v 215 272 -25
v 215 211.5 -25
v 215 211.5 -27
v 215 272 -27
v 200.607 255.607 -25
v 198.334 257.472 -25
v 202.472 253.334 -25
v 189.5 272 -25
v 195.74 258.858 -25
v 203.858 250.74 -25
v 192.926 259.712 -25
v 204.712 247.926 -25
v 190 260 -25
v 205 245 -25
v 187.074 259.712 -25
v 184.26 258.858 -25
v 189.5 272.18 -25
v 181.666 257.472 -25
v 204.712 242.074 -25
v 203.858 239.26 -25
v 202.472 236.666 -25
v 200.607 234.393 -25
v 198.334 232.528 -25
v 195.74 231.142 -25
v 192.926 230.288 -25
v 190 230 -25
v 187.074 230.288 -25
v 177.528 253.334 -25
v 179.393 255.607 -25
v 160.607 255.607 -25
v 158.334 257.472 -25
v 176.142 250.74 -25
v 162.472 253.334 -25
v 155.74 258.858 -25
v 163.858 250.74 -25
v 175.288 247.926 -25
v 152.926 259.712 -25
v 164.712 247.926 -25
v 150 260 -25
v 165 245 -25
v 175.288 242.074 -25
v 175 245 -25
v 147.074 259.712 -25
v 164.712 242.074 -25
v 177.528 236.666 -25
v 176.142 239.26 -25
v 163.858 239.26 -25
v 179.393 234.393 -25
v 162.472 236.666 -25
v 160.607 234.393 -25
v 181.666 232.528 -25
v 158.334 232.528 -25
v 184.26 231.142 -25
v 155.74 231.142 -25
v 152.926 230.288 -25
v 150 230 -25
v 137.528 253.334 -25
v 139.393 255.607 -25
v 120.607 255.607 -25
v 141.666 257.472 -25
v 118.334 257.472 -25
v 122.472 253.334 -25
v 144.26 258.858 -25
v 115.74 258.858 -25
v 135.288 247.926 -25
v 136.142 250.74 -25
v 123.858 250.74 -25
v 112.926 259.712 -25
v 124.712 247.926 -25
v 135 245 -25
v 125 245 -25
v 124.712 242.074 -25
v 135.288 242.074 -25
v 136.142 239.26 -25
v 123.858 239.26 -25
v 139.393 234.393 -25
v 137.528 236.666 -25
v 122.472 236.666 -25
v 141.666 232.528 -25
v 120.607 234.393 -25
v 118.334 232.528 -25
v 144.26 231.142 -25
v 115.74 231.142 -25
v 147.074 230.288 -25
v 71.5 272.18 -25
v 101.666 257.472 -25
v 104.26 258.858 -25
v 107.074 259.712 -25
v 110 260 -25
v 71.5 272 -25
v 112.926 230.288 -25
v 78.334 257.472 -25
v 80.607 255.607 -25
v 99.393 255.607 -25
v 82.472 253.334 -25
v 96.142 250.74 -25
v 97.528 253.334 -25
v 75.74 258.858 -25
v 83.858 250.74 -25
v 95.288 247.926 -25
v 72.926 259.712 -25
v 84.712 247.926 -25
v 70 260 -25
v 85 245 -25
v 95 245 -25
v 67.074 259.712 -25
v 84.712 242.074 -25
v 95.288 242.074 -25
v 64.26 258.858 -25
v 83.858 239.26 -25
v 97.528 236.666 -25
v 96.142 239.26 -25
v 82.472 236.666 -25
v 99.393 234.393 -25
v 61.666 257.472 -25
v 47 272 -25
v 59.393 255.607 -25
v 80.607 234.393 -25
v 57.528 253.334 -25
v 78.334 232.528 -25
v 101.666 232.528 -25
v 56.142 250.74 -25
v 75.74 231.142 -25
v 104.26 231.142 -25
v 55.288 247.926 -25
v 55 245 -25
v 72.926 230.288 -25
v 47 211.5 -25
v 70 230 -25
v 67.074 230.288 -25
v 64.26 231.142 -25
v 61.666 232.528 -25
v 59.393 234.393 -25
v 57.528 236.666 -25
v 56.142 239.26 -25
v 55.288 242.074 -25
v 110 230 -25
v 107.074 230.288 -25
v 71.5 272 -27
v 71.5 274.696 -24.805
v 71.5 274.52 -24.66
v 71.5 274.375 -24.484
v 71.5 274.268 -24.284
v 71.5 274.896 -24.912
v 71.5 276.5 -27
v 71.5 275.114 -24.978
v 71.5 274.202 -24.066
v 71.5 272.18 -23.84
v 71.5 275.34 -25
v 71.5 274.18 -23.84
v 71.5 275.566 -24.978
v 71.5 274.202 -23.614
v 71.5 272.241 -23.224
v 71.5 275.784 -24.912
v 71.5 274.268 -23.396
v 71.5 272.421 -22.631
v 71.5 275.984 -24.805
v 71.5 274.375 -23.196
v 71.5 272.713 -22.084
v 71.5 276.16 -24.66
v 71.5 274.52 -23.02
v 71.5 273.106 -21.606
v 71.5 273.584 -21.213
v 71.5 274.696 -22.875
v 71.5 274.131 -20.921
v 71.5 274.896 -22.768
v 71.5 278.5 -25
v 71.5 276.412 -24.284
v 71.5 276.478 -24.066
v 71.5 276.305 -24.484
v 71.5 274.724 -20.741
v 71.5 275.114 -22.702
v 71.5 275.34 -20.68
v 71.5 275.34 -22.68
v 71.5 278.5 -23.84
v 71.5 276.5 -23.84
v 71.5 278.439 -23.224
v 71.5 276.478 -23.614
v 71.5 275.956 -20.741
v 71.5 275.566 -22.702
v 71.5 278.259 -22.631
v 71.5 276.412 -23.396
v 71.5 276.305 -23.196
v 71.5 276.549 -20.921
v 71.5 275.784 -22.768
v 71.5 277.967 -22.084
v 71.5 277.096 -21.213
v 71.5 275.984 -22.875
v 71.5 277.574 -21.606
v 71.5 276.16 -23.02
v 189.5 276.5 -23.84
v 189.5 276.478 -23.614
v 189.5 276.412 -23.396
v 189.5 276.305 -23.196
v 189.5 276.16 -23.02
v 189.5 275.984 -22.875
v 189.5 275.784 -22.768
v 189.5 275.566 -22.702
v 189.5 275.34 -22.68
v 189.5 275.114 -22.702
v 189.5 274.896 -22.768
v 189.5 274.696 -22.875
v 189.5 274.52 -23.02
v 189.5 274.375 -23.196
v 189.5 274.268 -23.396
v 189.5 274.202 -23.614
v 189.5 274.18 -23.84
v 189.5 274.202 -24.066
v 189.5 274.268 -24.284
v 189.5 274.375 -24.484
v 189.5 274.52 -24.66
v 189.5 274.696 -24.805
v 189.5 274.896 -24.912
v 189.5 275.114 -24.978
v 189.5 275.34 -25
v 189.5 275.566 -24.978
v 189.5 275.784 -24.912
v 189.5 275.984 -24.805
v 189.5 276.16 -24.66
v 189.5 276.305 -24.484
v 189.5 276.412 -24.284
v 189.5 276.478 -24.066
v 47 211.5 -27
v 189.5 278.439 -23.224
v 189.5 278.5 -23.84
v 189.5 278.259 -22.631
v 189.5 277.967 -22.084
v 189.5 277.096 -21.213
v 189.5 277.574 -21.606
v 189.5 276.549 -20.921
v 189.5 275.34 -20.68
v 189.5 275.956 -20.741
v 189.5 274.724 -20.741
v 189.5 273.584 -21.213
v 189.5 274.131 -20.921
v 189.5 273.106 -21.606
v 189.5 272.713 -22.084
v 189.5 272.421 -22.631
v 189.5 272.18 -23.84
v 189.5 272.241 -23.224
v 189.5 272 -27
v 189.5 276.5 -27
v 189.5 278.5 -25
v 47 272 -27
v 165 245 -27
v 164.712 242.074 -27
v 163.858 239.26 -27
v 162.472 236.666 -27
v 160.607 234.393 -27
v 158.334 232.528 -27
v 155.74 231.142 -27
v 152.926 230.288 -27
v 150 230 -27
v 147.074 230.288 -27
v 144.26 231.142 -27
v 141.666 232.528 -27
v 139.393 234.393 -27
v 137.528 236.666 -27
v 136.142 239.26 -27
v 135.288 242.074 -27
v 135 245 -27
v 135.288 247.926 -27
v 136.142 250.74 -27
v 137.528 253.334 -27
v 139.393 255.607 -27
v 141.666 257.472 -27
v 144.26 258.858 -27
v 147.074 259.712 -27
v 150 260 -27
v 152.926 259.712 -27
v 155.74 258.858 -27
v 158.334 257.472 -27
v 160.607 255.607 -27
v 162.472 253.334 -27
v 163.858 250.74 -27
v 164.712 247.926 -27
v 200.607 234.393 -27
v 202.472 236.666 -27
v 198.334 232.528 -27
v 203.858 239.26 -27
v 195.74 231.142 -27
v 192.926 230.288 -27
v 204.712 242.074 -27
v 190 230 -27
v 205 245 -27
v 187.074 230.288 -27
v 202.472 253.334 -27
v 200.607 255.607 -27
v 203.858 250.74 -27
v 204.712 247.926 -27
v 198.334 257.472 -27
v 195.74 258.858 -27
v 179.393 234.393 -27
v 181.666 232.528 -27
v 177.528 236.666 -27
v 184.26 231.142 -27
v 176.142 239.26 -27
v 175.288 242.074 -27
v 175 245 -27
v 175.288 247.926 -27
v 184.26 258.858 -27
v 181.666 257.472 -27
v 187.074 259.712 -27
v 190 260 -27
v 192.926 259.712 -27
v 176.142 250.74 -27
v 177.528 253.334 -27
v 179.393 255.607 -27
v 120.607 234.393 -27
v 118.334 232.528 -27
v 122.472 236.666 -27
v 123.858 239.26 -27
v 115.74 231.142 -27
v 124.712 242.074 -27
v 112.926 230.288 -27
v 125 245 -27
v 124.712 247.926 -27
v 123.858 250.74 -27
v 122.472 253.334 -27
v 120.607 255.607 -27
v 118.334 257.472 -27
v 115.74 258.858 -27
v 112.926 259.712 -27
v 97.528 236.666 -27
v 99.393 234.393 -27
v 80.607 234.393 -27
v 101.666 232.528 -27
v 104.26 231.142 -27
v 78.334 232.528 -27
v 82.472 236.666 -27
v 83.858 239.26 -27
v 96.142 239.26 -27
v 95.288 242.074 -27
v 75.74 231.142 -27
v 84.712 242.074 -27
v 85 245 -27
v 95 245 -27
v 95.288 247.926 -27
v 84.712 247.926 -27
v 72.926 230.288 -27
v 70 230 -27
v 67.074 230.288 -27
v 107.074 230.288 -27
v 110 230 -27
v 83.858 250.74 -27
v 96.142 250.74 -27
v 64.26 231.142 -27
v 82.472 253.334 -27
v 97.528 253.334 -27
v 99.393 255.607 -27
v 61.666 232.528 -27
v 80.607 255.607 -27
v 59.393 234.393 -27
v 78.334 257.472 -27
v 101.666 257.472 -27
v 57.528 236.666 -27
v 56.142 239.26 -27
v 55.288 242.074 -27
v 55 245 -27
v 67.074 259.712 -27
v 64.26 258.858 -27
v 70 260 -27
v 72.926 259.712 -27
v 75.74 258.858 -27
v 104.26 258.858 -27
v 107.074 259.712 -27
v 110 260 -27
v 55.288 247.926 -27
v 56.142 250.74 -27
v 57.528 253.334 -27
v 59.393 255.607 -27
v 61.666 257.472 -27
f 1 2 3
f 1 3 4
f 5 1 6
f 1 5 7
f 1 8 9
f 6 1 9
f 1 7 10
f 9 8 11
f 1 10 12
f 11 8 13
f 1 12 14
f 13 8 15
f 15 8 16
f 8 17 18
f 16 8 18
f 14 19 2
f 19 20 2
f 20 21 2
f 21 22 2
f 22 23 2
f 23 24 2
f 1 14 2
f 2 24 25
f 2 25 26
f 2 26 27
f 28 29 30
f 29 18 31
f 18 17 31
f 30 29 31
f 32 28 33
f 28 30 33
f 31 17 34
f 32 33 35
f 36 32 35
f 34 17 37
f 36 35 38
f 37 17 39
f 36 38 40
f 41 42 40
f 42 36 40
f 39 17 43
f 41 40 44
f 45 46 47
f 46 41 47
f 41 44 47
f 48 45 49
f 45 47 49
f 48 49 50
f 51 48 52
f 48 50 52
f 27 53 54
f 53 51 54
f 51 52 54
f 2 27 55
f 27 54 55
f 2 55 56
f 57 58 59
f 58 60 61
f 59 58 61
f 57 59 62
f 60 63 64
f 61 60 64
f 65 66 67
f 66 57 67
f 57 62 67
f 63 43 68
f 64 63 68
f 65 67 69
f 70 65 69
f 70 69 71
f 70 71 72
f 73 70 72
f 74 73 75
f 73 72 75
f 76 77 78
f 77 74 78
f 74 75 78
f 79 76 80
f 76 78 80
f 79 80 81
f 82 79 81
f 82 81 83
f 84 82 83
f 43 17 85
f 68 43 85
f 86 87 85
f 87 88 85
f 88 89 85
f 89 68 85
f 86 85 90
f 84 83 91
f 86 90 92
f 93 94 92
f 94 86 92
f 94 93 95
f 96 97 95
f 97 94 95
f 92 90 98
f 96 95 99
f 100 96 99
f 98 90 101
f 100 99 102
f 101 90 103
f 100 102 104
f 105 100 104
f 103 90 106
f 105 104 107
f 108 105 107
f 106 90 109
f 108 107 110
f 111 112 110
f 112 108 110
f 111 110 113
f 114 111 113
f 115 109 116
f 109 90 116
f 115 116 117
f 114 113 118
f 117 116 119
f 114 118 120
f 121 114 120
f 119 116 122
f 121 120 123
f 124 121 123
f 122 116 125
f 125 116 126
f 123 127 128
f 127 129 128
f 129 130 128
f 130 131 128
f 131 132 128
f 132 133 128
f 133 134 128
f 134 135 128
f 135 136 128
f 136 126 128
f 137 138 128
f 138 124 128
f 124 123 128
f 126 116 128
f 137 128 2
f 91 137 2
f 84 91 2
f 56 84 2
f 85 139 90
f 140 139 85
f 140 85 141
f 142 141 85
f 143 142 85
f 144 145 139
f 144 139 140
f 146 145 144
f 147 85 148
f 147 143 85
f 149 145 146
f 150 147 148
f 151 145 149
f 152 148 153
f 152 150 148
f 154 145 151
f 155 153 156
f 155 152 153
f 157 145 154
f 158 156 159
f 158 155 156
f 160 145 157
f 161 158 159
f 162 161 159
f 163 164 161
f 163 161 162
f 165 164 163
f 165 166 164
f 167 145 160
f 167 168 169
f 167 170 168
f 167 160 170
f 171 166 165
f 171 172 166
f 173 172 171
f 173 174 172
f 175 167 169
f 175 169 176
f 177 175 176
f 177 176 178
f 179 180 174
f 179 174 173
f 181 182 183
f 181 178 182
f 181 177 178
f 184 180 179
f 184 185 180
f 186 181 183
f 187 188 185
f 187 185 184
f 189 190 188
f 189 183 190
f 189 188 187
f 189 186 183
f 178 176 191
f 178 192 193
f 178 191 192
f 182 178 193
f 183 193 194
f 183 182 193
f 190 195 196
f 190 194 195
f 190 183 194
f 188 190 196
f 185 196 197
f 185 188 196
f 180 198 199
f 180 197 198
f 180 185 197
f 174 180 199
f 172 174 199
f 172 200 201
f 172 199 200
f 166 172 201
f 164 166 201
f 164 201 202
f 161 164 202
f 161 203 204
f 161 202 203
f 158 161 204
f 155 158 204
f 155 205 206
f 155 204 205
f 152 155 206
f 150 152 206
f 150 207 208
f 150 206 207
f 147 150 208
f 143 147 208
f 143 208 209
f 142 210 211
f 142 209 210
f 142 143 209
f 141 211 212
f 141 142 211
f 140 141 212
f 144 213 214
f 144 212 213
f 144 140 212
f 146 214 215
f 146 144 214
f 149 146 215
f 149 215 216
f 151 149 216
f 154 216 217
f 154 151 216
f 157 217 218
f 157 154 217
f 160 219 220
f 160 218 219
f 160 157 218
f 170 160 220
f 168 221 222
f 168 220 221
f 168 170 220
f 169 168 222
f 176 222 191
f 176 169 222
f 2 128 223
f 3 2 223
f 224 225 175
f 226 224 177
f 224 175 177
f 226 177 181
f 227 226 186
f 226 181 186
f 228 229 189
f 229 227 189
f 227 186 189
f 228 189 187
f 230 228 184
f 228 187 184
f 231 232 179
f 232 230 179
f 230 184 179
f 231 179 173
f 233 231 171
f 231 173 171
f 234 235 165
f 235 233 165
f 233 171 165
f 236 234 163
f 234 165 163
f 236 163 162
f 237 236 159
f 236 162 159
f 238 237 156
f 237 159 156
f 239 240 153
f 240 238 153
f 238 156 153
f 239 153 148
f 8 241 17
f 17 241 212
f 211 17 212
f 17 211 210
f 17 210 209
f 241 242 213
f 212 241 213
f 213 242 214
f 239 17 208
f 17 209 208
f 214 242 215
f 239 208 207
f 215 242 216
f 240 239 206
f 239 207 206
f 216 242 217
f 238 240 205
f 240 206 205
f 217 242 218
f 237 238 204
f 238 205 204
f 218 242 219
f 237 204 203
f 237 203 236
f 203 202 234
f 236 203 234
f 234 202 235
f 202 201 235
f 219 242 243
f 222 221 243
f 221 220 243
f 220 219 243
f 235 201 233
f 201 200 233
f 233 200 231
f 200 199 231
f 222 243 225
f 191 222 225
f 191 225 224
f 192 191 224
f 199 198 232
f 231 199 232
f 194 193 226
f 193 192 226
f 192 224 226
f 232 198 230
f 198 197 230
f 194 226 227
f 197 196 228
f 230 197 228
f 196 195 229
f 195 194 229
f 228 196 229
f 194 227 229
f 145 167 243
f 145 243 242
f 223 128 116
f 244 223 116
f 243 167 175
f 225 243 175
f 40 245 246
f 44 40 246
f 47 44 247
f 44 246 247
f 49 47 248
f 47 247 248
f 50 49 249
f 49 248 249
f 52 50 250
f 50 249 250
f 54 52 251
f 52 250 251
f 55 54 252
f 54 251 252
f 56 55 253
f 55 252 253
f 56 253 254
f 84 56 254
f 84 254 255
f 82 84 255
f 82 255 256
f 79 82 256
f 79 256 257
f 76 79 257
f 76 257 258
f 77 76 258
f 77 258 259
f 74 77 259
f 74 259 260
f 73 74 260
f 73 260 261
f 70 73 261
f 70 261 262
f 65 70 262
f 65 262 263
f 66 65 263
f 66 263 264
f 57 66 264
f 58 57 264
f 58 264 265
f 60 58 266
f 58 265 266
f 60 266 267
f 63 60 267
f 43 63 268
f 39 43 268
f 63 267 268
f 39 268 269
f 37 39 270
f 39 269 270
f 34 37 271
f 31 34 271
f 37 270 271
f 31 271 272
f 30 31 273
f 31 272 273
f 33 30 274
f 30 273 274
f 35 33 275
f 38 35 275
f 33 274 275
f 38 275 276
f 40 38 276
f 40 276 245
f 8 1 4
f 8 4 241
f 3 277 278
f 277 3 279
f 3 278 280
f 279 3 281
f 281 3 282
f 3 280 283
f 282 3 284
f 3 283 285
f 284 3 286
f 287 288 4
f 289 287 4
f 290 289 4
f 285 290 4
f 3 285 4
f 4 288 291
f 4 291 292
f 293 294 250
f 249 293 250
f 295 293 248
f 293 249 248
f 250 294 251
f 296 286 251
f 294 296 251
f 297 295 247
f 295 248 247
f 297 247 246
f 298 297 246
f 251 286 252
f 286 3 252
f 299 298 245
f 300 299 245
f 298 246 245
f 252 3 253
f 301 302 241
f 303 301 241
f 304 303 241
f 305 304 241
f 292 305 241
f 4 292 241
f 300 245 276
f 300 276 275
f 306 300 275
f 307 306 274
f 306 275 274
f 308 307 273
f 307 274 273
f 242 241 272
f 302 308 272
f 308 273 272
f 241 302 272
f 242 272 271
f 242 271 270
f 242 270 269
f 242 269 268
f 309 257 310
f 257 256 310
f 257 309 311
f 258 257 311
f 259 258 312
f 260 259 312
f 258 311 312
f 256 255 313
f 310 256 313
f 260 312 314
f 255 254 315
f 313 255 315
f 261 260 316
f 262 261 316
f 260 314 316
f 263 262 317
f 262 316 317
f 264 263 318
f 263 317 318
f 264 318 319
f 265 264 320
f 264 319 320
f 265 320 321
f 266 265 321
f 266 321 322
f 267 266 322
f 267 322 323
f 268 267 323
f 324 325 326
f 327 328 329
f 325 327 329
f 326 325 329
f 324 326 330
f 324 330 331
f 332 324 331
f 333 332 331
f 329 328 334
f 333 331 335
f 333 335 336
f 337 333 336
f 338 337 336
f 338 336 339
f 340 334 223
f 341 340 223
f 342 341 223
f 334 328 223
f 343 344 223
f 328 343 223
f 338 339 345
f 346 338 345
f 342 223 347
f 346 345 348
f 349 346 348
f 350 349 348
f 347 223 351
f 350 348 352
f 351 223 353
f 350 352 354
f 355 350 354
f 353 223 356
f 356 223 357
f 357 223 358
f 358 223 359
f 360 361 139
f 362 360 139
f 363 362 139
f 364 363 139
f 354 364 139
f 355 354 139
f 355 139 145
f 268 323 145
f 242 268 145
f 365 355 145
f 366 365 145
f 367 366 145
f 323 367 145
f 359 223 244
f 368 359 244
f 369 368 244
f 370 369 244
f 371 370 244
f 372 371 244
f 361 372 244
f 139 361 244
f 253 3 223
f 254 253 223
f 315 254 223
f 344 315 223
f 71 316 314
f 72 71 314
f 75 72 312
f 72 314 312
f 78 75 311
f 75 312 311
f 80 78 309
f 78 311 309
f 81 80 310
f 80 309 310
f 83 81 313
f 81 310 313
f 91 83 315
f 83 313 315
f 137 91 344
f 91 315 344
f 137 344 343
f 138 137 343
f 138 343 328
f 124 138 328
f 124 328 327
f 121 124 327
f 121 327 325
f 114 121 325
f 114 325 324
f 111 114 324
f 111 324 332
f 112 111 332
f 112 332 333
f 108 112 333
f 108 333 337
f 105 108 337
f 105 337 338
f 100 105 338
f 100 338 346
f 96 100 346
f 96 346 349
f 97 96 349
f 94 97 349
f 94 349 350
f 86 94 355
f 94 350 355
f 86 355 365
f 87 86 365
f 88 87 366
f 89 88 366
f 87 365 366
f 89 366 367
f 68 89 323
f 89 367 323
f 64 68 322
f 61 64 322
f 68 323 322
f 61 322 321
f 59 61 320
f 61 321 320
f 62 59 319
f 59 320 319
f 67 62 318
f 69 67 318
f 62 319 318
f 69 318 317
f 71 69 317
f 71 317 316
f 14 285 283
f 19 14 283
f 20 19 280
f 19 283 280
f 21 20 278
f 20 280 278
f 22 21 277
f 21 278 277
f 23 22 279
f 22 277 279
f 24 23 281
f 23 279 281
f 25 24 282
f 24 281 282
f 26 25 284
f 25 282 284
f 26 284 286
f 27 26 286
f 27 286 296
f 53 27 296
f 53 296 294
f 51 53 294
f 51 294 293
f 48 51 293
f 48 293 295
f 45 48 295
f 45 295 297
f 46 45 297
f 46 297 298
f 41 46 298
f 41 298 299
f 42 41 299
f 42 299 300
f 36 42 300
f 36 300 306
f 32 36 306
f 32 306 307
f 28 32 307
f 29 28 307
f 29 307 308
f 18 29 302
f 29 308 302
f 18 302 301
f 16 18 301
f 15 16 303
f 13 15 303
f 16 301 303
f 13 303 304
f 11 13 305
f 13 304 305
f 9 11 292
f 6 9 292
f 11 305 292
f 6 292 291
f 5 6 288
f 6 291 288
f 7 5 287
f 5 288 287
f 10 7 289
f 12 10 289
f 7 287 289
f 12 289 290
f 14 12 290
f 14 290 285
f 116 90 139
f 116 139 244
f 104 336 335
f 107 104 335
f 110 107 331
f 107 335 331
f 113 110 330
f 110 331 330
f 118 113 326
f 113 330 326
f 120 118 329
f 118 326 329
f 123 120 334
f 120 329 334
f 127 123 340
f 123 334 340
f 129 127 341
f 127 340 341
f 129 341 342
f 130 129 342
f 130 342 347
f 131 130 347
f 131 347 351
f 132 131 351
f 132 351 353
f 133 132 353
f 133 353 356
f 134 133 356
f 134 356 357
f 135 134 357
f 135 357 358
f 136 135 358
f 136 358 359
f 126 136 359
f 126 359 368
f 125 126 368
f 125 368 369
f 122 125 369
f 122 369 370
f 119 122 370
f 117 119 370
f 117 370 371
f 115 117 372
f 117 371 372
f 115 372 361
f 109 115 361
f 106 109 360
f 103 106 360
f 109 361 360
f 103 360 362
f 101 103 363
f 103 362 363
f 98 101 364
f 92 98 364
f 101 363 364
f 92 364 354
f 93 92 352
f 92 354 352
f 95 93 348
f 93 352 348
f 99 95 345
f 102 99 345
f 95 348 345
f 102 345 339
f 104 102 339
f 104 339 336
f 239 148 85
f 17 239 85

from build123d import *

# Parameters (mm, degrees)
SKETCH137_R      = 15
EXTRUDE127_DEPTH = 4
SKETCH078_W      = 25.5
SKETCH078_H      = 8
EXTRUDE070_DEPTH = 7
SKETCH075_R      = 1.16
EXTRUDE067_DEPTH = 168


with BuildPart() as extrude127:
    # Sketch137 → Extrude127 (new body)
    with BuildSketch(Plane(origin=(0, 0, -28), x_dir=(1, 0, 0), z_dir=(0, 0, -1))):
        with Locations((150, -245)):
            Circle(SKETCH137_R)
        with Locations((190, -245)):
            Circle(SKETCH137_R)
        with Locations((70, -245)):
            Circle(SKETCH137_R)
        with Locations((110, -245)):
            Circle(SKETCH137_R)
    extrude(amount=-EXTRUDE127_DEPTH)


with BuildPart() as compound026:
    # Sketch078 → Extrude070 (new body)
    with BuildSketch(Plane(origin=(0, 279, 0), x_dir=(-1, 0, 0), z_dir=(0, 1, 0))):
        with Locations((-202.25, -24)):
            Rectangle(SKETCH078_W, SKETCH078_H)
        with Locations((-58.75, -24)):
            Rectangle(SKETCH078_W, SKETCH078_H)
    extrude(amount=-EXTRUDE070_DEPTH)

    # Compound026: union Extrude127
    add(extrude127.part)


with BuildPart() as battery_lid:
    # Sketch075 → Extrude067 (new body)
    with BuildSketch(Plane.YZ.offset(47)):
        with BuildLine():
            Line((272.18, -25), (211.5, -25))
            Line((211.5, -25), (211.5, -27))
            Line((211.5, -27), (276.5, -27))
            Line((278.5, -25), (276.5, -27))
            Line((278.5, -25), (278.5, -23.84))
            ThreePointArc((278.5, -23.84), (275.34, -20.68), (272.18, -23.84))
            Line((272.18, -23.84), (272.18, -25))
        make_face()
        with Locations((275.34, -23.84)):
            Circle(SKETCH075_R, mode=Mode.SUBTRACT)
    extrude(amount=EXTRUDE067_DEPTH)

    # Cut014: cut Compound026
    add(compound026.part, mode=Mode.SUBTRACT)


solid = battery_lid.part
